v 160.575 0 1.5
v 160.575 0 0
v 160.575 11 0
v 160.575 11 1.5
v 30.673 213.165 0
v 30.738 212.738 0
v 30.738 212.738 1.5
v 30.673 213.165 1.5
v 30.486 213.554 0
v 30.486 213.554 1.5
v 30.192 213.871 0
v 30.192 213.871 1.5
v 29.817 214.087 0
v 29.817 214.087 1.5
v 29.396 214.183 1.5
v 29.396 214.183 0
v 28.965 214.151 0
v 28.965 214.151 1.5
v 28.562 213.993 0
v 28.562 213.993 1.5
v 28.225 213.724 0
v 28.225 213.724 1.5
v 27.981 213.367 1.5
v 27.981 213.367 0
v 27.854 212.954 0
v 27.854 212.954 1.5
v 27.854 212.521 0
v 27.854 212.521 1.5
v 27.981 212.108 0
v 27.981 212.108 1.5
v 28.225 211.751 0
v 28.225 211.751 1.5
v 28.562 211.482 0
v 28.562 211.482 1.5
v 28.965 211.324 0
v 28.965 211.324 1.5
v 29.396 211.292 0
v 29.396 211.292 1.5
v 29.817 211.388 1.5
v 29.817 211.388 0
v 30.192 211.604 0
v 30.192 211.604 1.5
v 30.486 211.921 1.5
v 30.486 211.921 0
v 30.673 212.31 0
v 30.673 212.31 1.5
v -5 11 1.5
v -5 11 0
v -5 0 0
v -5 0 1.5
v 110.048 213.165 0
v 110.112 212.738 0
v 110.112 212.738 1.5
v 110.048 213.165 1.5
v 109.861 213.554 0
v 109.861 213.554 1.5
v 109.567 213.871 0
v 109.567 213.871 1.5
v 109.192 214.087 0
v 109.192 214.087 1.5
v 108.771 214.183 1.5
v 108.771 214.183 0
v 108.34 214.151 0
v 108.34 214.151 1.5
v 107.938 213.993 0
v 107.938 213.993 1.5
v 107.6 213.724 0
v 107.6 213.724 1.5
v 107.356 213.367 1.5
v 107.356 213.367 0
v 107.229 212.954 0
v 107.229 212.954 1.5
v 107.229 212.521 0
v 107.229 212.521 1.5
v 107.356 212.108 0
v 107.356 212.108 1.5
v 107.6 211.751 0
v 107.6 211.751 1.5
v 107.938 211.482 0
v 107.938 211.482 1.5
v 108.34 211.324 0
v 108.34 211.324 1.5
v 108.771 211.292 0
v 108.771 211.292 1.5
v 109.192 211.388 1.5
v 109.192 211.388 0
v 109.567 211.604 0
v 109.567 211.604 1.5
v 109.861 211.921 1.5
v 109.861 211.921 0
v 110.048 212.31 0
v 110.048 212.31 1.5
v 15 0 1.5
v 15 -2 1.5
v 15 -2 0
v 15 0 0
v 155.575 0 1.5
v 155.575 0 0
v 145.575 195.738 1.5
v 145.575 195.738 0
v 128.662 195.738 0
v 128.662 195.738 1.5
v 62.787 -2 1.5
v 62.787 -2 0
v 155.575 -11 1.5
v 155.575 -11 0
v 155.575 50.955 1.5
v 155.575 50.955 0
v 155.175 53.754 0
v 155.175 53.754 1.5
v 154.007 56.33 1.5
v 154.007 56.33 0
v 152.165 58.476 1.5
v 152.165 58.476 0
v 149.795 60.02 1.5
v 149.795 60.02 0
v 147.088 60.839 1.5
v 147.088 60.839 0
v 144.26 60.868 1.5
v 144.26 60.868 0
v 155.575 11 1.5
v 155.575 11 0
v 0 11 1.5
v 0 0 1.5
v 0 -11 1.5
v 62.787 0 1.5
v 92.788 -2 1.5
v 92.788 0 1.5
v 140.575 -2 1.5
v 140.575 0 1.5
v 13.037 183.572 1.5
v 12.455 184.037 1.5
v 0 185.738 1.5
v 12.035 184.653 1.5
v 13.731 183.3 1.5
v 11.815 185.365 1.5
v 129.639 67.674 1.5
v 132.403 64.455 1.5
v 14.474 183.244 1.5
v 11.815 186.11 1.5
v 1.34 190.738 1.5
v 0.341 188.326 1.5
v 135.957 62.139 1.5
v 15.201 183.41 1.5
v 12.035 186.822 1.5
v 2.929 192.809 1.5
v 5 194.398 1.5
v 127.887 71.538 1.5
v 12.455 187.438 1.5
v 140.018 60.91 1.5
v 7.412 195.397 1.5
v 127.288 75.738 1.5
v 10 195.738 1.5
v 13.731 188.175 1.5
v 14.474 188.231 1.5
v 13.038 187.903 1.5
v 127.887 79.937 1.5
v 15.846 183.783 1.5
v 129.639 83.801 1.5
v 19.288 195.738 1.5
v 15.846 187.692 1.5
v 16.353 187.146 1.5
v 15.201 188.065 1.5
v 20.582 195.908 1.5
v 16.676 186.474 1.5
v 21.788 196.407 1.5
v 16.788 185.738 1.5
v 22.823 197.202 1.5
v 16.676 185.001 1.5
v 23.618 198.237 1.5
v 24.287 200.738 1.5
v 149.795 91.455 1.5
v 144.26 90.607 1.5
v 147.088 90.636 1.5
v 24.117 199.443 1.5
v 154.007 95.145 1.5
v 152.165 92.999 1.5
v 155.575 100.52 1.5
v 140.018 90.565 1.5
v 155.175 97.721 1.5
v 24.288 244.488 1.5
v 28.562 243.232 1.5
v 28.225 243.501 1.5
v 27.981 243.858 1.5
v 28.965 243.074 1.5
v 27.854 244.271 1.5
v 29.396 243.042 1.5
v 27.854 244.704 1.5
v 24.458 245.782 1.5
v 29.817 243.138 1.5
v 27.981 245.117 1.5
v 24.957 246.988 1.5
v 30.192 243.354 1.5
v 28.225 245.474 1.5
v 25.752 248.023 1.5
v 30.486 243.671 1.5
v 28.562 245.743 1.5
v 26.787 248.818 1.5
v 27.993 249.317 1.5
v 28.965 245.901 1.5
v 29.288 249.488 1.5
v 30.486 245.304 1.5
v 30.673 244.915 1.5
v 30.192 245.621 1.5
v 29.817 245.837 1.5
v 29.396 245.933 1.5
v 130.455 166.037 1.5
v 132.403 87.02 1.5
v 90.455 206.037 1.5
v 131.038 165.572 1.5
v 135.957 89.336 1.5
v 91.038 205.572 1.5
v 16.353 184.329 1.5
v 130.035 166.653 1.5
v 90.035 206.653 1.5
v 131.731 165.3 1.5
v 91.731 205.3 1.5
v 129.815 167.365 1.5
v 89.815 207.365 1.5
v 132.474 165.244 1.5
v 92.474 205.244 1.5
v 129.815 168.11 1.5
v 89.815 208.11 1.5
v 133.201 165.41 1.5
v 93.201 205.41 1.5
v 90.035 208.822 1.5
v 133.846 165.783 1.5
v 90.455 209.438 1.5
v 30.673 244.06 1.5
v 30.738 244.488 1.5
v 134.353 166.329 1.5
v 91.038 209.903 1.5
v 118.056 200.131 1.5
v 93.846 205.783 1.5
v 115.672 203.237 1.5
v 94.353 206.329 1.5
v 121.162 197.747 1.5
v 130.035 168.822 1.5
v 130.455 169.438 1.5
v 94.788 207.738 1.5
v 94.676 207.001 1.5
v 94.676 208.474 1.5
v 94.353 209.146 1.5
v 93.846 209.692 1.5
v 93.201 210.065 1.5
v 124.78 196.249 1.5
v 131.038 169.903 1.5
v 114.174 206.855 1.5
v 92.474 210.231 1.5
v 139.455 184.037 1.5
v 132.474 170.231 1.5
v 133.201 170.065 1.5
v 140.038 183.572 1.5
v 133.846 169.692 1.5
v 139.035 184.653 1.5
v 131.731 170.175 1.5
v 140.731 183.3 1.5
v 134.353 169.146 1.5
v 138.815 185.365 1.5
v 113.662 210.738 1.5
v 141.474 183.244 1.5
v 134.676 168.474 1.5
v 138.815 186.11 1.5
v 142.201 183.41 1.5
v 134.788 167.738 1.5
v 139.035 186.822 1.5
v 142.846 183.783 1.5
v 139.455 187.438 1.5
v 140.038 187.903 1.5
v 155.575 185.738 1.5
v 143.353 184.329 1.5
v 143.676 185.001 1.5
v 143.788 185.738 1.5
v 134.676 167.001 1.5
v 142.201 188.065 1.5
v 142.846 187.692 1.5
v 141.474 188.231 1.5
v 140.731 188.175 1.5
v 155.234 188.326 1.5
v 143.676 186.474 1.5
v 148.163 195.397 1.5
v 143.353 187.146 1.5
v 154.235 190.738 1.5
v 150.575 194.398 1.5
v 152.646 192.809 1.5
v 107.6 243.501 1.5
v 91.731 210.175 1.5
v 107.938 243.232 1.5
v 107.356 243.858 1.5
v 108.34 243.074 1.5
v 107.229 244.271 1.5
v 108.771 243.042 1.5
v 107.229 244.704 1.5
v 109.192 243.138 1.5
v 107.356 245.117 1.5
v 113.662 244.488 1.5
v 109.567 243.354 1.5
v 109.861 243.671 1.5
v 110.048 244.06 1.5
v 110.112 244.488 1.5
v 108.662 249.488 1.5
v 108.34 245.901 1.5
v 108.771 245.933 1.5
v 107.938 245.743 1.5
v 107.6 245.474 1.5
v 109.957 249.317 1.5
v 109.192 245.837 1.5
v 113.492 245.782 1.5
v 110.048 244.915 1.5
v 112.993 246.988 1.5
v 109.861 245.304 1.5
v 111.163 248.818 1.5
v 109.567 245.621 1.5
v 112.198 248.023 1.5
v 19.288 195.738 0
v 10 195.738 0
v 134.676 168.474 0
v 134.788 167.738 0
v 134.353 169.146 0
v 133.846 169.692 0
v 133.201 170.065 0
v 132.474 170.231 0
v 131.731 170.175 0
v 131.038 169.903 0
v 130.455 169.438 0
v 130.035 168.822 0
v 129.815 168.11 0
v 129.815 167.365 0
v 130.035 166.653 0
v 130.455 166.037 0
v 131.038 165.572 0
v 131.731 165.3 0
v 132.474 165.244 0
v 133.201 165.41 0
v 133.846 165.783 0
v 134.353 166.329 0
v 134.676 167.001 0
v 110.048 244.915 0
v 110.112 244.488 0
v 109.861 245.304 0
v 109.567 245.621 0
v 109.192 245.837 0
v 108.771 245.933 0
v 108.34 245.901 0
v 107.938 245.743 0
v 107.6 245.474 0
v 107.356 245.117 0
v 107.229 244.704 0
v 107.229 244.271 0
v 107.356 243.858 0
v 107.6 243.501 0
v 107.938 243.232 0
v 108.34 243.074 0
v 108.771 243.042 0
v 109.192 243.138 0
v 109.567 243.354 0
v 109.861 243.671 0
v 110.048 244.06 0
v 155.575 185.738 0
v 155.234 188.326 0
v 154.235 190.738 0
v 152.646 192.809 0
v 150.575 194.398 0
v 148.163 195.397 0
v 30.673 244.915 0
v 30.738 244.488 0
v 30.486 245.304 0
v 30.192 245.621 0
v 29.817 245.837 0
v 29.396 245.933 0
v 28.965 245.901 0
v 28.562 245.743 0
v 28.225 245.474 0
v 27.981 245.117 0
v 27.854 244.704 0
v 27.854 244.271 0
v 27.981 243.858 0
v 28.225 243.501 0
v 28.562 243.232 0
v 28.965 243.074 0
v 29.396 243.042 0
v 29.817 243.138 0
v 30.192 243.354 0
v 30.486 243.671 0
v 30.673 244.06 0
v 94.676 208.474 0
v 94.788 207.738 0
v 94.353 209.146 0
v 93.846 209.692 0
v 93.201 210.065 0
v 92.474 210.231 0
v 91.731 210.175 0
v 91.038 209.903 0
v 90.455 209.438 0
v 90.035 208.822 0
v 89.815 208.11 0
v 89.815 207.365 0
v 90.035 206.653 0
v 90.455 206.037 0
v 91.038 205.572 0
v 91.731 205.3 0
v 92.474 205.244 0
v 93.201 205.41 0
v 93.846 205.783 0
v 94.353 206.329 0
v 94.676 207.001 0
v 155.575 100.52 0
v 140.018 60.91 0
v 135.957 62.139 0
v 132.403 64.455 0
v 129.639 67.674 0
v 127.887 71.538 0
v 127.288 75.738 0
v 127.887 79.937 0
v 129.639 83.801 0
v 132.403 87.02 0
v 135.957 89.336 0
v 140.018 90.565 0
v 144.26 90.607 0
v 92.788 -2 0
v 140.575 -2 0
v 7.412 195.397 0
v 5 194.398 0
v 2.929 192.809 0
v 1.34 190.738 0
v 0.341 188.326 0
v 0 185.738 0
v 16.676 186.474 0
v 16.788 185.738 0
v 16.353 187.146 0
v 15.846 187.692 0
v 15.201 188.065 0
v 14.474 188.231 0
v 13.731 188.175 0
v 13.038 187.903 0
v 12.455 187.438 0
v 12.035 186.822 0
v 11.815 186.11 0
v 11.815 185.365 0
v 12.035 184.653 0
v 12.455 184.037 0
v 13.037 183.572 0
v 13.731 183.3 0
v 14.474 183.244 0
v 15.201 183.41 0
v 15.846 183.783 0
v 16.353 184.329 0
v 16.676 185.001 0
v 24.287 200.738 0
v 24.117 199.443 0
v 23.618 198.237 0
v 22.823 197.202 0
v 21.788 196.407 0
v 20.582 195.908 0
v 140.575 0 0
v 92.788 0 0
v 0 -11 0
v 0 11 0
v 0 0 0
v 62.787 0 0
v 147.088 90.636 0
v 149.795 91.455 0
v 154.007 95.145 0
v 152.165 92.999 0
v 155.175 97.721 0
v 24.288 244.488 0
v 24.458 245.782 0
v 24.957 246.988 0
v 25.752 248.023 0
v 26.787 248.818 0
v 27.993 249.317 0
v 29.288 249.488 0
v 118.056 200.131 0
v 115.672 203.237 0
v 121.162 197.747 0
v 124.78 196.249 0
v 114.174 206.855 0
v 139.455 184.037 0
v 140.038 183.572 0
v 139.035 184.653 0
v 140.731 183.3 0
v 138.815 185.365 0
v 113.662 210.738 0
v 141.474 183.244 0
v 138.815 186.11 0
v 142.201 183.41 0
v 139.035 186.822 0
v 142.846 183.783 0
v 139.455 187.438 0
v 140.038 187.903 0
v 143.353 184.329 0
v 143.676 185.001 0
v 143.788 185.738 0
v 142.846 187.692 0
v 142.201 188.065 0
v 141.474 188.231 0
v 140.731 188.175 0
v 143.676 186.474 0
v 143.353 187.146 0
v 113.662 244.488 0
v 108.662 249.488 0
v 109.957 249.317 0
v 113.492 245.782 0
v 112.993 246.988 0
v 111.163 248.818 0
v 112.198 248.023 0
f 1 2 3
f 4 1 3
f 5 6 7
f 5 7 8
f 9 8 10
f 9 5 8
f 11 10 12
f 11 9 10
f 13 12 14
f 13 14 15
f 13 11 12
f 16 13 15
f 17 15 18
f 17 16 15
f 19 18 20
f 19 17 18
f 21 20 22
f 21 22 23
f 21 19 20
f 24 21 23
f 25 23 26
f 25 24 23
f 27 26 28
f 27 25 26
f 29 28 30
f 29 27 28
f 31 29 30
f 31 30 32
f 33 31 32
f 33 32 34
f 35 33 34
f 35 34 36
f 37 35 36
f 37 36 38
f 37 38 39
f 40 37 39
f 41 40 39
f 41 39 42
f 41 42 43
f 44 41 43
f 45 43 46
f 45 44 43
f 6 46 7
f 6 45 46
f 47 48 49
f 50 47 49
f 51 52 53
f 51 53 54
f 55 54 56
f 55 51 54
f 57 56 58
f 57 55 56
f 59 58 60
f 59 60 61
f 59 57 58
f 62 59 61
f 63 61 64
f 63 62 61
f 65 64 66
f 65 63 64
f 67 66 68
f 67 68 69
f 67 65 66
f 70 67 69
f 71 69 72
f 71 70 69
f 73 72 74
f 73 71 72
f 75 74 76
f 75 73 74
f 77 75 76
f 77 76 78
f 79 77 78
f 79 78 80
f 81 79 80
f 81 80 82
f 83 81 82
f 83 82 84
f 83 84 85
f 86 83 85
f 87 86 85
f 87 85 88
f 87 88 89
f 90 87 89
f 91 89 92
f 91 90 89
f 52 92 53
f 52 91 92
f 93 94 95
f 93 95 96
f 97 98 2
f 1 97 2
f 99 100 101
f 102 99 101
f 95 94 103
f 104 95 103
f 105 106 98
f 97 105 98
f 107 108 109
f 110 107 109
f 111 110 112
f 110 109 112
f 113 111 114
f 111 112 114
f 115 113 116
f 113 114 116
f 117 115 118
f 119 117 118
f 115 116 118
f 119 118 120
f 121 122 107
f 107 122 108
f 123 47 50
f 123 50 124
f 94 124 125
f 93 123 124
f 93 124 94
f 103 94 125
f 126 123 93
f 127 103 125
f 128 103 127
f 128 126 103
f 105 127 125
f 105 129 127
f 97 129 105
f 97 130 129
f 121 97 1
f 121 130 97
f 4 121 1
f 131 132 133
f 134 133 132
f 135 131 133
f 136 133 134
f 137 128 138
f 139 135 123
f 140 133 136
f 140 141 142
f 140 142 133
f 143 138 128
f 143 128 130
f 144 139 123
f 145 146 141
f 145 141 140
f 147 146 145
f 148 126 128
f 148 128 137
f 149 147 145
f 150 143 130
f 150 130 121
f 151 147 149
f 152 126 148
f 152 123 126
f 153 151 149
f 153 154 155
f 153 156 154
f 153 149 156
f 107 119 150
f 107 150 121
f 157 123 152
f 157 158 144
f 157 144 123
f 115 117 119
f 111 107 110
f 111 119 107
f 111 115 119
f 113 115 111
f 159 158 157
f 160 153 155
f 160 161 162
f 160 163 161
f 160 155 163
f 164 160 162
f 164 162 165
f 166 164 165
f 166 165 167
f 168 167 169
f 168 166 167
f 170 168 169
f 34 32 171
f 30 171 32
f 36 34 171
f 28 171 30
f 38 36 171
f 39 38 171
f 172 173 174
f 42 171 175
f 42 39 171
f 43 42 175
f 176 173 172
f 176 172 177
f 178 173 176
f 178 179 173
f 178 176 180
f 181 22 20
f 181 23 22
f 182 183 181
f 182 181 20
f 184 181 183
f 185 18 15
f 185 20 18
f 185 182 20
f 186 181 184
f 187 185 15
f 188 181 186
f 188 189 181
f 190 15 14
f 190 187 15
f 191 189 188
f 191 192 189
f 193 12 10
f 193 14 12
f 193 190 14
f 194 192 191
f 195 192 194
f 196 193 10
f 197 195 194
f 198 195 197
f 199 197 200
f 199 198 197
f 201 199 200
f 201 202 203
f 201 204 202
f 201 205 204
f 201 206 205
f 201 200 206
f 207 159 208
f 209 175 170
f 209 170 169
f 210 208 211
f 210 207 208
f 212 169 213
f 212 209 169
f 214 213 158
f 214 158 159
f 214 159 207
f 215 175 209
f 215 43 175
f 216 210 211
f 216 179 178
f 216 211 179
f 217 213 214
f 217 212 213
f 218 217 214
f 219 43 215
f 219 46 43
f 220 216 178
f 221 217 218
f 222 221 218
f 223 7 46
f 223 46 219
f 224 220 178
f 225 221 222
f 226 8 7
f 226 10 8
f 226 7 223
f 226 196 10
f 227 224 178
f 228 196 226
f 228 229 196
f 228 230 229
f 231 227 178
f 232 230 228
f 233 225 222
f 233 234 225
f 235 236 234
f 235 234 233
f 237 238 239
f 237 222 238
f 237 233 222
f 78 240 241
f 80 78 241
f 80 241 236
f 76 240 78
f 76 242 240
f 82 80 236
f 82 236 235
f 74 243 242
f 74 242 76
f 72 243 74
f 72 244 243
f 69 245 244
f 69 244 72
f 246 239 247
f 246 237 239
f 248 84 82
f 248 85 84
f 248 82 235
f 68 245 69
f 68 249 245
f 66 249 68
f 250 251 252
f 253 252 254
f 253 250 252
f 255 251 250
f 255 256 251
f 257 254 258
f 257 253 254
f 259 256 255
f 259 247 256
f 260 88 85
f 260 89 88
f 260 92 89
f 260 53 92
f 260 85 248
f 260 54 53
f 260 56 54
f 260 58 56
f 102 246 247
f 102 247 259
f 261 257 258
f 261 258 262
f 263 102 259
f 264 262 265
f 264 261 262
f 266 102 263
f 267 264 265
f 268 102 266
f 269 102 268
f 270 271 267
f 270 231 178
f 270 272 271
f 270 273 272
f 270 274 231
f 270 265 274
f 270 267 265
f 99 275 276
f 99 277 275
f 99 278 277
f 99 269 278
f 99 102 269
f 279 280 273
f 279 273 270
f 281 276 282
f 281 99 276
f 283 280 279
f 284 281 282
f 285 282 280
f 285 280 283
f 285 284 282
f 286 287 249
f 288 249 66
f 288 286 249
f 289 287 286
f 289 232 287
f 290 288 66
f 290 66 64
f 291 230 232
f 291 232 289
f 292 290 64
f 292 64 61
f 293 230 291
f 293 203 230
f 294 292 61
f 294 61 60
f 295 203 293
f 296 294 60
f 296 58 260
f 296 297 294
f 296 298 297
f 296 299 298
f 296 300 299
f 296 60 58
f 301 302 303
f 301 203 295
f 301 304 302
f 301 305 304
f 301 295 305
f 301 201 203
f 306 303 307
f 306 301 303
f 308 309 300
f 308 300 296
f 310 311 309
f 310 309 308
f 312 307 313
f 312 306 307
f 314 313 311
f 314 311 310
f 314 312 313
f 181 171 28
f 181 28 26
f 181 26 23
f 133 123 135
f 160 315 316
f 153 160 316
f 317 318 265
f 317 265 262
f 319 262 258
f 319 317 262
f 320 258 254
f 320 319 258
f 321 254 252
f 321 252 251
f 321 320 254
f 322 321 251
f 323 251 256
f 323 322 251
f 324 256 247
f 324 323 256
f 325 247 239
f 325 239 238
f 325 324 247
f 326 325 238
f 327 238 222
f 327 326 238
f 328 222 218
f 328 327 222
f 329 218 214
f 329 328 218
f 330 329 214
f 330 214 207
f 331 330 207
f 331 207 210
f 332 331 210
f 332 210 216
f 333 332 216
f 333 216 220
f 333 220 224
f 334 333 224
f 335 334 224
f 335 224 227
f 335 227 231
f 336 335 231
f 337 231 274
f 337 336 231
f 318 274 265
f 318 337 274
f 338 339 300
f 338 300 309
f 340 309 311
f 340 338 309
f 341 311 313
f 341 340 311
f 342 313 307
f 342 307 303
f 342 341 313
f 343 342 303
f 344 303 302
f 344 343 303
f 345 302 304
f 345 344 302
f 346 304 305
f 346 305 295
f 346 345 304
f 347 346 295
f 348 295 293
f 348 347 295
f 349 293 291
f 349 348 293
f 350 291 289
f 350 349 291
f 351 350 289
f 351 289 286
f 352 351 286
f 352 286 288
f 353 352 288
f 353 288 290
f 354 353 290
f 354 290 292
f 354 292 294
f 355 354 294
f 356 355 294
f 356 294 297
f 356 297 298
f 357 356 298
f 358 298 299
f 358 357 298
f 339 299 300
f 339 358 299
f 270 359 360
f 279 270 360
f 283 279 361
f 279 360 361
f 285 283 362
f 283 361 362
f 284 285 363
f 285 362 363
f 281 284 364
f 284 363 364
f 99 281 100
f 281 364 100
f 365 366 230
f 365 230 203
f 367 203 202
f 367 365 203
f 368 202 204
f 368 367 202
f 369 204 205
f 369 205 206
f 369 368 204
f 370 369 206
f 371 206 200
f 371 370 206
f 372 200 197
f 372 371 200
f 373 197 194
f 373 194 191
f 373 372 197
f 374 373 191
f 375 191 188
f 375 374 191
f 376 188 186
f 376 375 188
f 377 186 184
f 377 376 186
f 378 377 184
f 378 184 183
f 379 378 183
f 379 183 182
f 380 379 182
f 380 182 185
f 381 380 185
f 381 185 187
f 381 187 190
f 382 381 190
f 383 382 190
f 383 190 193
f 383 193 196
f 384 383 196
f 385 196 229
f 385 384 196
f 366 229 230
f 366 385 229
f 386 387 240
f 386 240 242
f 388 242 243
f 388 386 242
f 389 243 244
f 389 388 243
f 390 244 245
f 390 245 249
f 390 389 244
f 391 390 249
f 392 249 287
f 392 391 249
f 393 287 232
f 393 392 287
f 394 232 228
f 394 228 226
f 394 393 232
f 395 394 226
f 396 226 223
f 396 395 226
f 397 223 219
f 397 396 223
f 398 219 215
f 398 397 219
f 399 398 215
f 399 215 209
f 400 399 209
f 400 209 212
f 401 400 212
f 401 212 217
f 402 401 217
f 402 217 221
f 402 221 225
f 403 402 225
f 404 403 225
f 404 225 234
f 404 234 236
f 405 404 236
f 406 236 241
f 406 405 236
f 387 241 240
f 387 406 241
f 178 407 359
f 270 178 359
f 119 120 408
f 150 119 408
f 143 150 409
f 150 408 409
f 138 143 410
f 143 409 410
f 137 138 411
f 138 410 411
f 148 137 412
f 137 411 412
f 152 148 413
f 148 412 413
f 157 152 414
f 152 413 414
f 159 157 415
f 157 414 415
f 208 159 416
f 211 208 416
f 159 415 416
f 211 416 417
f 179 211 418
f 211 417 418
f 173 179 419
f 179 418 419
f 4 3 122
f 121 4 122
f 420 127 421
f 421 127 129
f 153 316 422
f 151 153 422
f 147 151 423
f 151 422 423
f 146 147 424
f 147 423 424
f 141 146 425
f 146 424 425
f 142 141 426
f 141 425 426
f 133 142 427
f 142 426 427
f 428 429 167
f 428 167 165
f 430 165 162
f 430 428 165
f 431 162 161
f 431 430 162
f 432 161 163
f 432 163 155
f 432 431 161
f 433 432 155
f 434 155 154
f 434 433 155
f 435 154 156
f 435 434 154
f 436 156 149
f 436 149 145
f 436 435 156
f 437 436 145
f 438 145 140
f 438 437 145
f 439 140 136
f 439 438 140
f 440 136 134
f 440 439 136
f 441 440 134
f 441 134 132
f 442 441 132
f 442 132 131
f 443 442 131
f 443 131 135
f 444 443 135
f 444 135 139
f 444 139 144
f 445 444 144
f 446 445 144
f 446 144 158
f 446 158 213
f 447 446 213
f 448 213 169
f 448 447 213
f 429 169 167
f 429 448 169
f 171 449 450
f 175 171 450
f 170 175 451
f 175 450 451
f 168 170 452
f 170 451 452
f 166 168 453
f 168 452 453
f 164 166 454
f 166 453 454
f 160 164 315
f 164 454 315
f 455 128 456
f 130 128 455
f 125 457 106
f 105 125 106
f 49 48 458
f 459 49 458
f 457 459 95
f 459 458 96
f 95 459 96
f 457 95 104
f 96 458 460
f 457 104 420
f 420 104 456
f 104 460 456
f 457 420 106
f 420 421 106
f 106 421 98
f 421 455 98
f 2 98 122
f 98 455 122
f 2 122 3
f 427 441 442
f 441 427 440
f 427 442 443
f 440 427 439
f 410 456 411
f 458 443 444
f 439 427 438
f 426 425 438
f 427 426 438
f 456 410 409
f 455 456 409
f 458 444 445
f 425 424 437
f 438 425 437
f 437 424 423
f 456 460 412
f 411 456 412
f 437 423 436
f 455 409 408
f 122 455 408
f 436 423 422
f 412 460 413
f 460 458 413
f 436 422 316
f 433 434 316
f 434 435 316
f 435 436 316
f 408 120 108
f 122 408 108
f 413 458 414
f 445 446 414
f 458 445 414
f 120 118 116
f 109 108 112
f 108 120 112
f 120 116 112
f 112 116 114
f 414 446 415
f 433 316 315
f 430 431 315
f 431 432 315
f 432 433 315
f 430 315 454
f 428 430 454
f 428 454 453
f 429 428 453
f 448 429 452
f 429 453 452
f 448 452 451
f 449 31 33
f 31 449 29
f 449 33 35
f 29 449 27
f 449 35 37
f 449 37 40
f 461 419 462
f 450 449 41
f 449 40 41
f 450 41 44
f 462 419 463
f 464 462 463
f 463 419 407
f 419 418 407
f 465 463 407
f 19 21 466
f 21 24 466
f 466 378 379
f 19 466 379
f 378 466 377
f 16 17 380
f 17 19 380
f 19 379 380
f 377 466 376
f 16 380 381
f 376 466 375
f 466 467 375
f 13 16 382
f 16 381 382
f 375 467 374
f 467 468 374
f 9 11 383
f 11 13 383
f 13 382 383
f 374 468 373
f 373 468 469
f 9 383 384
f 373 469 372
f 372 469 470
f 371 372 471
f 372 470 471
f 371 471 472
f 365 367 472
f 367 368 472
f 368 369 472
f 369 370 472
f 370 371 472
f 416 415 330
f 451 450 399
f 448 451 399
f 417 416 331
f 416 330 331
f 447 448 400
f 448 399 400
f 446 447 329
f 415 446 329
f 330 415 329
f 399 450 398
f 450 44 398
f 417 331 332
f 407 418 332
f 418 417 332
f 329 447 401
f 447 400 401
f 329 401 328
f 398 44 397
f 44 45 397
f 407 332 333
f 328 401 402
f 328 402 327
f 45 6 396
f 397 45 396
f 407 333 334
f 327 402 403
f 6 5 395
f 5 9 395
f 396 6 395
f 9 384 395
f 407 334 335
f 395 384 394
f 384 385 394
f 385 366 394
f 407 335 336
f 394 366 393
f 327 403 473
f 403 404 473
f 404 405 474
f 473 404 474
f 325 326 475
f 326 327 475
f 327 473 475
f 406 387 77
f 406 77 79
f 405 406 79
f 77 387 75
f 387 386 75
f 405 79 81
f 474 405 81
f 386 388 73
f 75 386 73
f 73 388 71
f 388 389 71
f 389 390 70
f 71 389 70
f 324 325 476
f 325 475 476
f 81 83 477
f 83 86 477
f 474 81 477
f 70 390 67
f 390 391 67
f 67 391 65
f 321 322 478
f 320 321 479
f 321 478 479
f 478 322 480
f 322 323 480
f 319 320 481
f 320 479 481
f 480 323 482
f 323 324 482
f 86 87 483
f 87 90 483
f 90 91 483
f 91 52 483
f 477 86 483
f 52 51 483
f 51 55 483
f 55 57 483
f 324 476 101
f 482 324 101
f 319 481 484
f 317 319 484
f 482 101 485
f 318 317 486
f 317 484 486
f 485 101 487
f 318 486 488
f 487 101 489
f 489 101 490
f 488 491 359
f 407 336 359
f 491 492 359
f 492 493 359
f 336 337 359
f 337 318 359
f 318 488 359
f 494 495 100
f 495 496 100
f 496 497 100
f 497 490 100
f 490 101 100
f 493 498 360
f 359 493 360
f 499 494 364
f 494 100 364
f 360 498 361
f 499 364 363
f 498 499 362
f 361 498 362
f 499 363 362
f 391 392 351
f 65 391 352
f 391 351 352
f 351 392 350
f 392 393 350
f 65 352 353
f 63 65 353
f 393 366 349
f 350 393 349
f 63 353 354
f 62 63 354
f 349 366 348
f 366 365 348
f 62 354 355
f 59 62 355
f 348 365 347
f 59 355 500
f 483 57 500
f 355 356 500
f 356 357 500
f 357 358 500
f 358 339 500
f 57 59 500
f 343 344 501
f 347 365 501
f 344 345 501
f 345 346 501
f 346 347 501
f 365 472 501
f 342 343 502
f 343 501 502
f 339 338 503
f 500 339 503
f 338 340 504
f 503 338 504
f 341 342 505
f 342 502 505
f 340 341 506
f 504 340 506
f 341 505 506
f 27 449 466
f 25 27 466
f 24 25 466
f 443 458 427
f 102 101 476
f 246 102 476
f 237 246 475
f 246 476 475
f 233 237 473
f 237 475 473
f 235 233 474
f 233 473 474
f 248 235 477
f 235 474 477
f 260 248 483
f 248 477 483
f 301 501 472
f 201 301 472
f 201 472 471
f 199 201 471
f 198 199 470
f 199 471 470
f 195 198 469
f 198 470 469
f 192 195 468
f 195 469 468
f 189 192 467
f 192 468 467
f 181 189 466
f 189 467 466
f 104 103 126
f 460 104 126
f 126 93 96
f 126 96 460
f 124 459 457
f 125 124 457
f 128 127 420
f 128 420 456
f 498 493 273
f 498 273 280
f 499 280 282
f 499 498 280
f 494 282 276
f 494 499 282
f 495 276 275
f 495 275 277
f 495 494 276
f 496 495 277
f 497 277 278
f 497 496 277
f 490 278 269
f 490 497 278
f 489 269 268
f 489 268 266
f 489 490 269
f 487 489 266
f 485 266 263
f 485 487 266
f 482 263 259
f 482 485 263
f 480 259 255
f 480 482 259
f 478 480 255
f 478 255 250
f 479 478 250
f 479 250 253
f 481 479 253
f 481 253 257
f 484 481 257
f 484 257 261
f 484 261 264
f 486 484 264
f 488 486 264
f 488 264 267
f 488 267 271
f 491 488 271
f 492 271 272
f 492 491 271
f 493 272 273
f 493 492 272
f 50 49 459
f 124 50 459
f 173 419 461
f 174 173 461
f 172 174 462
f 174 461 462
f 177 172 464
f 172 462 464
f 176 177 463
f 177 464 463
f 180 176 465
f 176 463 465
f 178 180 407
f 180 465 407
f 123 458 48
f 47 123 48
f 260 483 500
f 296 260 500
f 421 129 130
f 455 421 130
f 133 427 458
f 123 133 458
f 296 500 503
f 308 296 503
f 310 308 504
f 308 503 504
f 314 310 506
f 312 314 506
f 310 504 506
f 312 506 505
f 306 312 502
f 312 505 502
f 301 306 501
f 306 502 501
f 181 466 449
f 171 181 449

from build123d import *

# Parameters (mm, degrees)
SKETCH1_R           = 2.5
SKETCH1_R_2         = 1.45
BOSS_EXTRUDE1_DEPTH = 1.5
SKETCH2_W           = 47.7875
SKETCH2_H           = 2
CUT_EXTRUDE1_DEPTH  = 2.5


with BuildPart() as part:
    # Sketch1 → Boss-Extrude1 (new body)
    with BuildSketch(Plane.XY):
        with BuildLine():
            Line((24.2875, 244.4875), (24.2875, 200.7375))
            ThreePointArc((24.2875, 200.7375), (22.823033906, 197.201966094), (19.2875, 195.7375))
            Line((19.2875, 195.7375), (10, 195.7375))
            ThreePointArc((10, 195.7375), (2.928932188, 192.808567812), (0, 185.7375))
            Line((0, 185.7375), (0, 11))
            Line((0, 11), (-5, 11))
            Line((-5, 11), (-5, 0))
            Line((-5, 0), (0, 0))
            Line((0, 0), (0, -11))
            Line((0, -11), (155.575, -11))
            Line((155.575, -11), (155.575, 0))
            Line((155.575, 0), (160.575, 0))
            Line((160.575, 0), (160.575, 11))
            Line((160.575, 11), (155.575, 11))
            Line((155.575, 11), (155.575, 50.954595736))
            ThreePointArc((155.575, 50.954595736), (152.164764791, 58.476231197), (144.26, 60.867757442))
            ThreePointArc((144.26, 60.867757442), (127.2875, 75.7375), (144.26, 90.607242558))
            ThreePointArc((144.26, 90.607242558), (152.164764791, 92.998768803), (155.575, 100.520404264))
            Line((155.575, 100.520404264), (155.575, 185.7375))
            ThreePointArc((155.575, 185.7375), (152.646067812, 192.808567812), (145.575, 195.7375))
            Line((145.575, 195.7375), (128.6625, 195.7375))
            ThreePointArc((128.6625, 195.7375), (118.055898282, 200.130898282), (113.6625, 210.7375))
            Line((113.6625, 210.7375), (113.6625, 244.4875))
            ThreePointArc((113.6625, 244.4875), (112.198033906, 248.023033906), (108.6625, 249.4875))
            Line((108.6625, 249.4875), (29.2875, 249.4875))
            ThreePointArc((29.2875, 249.4875), (25.751966094, 248.023033906), (24.2875, 244.4875))
        make_face()
        with Locations((14.2875, 185.7375)):
            Circle(SKETCH1_R, mode=Mode.SUBTRACT)
        with Locations((141.2875, 185.7375)):
            Circle(SKETCH1_R, mode=Mode.SUBTRACT)
        with Locations((108.6625, 212.7375)):
            Circle(SKETCH1_R_2, mode=Mode.SUBTRACT)
        with Locations((108.6625, 244.4875)):
            Circle(SKETCH1_R_2, mode=Mode.SUBTRACT)
        with Locations((29.2875, 244.4875)):
            Circle(SKETCH1_R_2, mode=Mode.SUBTRACT)
        with Locations((29.2875, 212.7375)):
            Circle(SKETCH1_R_2, mode=Mode.SUBTRACT)
        with Locations((132.2875, 167.7375)):
            Circle(SKETCH1_R, mode=Mode.SUBTRACT)
        with Locations((92.2875, 207.7375)):
            Circle(SKETCH1_R, mode=Mode.SUBTRACT)
    extrude(amount=BOSS_EXTRUDE1_DEPTH)

    # Sketch2 → Cut-Extrude1 (cut, through all)
    with BuildSketch(Plane.XY.offset(1.5)):
        with Locations((38.89375, -1)):
            Rectangle(SKETCH2_W, SKETCH2_H)
        with Locations((116.68125, -1)):
            Rectangle(SKETCH2_W, SKETCH2_H)
    extrude(amount=-CUT_EXTRUDE1_DEPTH, mode=Mode.SUBTRACT)


solid = part.part
